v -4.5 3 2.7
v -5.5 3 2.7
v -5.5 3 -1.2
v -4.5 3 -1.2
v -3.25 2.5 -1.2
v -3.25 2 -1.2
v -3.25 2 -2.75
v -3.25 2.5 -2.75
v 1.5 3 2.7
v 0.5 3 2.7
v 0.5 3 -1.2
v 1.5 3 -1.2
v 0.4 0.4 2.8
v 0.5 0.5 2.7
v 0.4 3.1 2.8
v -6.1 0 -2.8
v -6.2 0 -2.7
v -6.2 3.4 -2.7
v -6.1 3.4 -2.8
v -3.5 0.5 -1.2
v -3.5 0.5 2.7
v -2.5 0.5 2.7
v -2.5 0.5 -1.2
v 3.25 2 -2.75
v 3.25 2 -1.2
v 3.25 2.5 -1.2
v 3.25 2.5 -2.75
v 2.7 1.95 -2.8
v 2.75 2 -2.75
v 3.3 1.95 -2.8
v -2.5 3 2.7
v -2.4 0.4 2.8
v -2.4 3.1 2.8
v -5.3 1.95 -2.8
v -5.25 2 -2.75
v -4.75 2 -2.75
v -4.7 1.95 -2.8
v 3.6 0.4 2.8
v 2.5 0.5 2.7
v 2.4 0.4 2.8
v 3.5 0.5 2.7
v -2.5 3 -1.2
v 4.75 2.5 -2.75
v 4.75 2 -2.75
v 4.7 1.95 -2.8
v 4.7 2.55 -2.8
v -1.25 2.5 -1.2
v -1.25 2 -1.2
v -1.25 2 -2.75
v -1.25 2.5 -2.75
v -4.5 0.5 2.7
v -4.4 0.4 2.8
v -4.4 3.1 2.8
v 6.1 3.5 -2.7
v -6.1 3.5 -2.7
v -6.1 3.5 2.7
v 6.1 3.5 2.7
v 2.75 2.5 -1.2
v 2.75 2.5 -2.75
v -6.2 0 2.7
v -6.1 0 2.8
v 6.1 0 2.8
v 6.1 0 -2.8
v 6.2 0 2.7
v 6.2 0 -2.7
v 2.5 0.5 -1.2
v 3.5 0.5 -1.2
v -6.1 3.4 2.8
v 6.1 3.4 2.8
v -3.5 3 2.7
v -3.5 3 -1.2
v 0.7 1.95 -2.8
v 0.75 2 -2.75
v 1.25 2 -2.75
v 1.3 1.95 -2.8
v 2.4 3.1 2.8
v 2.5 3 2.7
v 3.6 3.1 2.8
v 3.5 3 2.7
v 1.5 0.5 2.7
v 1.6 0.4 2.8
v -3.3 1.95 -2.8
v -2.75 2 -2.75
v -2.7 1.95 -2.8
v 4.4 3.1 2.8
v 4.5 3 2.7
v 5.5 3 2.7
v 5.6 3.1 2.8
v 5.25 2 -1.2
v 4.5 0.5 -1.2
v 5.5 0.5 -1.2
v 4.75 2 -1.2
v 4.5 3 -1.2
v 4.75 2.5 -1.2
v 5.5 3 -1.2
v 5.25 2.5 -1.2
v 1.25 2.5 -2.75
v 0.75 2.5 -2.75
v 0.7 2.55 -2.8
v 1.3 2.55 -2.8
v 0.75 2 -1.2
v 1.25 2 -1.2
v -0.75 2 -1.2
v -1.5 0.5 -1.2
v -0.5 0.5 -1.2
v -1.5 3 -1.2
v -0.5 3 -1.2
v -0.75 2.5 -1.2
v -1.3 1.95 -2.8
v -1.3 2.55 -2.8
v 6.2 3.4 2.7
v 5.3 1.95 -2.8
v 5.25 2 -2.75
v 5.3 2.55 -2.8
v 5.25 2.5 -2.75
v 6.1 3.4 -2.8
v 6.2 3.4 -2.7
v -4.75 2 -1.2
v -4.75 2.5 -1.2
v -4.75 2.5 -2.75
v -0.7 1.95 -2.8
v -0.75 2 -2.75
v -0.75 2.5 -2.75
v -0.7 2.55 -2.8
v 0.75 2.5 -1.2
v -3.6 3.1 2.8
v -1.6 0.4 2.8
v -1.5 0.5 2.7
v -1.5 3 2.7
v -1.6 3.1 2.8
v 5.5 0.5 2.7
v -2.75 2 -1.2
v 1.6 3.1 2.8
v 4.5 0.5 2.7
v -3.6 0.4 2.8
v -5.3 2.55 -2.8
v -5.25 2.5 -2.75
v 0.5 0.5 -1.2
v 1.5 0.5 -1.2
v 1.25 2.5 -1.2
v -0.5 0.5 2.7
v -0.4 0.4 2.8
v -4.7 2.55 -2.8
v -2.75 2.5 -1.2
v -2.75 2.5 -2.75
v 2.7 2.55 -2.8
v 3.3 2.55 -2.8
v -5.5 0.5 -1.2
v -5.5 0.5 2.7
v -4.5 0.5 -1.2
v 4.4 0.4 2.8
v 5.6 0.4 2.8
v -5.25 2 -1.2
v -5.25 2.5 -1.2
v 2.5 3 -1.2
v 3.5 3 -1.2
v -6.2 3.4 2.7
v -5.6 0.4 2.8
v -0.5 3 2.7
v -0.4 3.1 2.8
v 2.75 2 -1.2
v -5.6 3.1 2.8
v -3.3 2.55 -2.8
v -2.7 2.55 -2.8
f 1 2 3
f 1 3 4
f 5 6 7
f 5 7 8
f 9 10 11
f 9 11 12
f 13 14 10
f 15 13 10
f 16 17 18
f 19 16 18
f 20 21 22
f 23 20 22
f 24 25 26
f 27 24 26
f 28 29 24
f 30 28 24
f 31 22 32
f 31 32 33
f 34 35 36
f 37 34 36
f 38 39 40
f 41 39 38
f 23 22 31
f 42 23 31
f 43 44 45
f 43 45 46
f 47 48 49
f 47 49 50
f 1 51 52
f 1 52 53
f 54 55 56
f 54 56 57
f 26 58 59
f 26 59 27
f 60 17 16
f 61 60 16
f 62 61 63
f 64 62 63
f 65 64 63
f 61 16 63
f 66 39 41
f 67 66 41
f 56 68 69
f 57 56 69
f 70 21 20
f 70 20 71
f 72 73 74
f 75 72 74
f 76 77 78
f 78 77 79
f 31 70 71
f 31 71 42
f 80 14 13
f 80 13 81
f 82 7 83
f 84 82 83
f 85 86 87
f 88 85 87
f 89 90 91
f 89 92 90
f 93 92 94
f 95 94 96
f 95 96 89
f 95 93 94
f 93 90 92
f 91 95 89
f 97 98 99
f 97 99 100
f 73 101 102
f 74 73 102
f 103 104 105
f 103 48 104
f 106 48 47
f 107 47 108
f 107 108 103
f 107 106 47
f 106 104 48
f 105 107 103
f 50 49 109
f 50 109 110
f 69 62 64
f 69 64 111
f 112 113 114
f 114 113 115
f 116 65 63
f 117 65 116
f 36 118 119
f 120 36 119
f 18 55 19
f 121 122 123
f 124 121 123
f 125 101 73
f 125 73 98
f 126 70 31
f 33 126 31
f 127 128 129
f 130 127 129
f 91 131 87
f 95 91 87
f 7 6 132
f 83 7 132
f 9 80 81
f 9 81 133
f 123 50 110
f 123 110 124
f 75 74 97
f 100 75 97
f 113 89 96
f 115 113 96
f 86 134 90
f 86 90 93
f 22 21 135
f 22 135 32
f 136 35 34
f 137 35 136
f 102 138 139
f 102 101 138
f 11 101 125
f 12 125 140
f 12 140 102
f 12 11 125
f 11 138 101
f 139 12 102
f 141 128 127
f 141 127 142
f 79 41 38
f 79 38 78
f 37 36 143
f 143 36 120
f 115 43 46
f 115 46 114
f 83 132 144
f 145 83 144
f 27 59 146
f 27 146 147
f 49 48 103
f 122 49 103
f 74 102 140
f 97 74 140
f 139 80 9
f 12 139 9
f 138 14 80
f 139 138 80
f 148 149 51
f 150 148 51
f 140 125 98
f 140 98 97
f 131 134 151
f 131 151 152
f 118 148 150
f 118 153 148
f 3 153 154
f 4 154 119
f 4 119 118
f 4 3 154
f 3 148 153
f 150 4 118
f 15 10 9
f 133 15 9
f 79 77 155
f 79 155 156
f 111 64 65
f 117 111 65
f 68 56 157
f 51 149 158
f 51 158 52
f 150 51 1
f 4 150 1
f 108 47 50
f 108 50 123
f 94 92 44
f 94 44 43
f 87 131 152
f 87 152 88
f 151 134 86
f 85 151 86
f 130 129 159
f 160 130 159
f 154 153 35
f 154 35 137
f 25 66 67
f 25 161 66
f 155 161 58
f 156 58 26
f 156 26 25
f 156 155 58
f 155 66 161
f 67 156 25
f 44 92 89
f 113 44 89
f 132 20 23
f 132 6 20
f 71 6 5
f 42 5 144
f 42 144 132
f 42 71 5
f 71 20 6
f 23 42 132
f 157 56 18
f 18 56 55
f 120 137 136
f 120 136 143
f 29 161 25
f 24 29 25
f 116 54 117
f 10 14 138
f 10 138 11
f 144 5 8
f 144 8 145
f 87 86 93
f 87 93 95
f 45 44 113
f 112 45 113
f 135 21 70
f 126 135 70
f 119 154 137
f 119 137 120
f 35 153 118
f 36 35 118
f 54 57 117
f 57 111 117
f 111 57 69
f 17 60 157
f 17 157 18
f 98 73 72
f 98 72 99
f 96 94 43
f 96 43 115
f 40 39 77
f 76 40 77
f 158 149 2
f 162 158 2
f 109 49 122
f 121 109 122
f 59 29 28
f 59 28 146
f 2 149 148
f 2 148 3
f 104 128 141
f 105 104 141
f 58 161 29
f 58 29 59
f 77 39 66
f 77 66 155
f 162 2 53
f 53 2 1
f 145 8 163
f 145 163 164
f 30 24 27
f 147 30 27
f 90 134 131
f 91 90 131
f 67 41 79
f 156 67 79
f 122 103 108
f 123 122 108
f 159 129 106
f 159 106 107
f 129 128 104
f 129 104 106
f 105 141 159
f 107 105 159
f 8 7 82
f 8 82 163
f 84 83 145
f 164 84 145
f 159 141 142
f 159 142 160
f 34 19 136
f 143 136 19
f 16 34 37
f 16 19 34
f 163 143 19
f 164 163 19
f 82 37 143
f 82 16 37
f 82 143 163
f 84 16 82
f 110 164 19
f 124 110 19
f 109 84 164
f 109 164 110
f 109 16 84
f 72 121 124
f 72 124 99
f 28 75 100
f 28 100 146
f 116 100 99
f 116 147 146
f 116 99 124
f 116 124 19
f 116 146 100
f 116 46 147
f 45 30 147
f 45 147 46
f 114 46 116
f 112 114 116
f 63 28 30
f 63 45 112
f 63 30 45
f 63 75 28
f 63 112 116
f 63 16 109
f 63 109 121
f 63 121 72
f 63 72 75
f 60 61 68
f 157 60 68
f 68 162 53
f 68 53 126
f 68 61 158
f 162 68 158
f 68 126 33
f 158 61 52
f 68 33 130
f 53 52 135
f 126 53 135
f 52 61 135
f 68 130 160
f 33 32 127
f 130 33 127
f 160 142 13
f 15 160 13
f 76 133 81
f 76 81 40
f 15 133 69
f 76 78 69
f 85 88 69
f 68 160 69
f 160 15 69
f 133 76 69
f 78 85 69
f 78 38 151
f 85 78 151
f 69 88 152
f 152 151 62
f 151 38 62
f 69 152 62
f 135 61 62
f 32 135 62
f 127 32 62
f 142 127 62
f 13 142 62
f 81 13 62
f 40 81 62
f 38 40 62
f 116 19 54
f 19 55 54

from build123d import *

# Parameters (mm, degrees)
SKETCH1_W                  = 12.4
SKETCH1_H                  = 5.6
BOSS_EXTRUDE1_DEPTH        = 3.5
SKETCH2_W                  = 1
SKETCH2_H                  = 2.5
CUT_EXTRUDE1_DEPTH         = 4
CHAMFER1_SIZE              = 0.1
CUT_EXTRUDE2_REACH         = 10.166
SKETCH3_W                  = 0.5
SKETCH3_H                  = 0.5
CHAMFER3_SIZE              = 0.05
LPATTERN1_COUNT            = 6
LPATTERN1_PITCH            = 2
CHAMFER1_OF_LPATTERN1_SIZE = 0.1
CHAMFER3_OF_LPATTERN1_SIZE = 0.05
CHAMFER2_SIZE              = 0.1


with BuildPart() as part:
    # Sketch1 → Boss-Extrude1 (new body)
    with BuildSketch(Plane(origin=(0, 0, 0), x_dir=(1, 0, 0), z_dir=(0, 1, 0))):
        Rectangle(SKETCH1_W, SKETCH1_H)
    extrude(amount=BOSS_EXTRUDE1_DEPTH)

    # Sketch2 → Cut-Extrude1 (cut)
    with BuildSketch(Plane.XY.offset(2.8)):
        with Locations((-5, 1.75)):
            Rectangle(SKETCH2_W, SKETCH2_H)
    cut_extrude1 = extrude(amount=-CUT_EXTRUDE1_DEPTH, mode=Mode.SUBTRACT)

    # Chamfer1
    chamfer1_edges = [part.edges().sort_by_distance(p)[0] for p in [
        (-5, 3, 2.8),
        (-4.5, 1.75, 2.8),
        (-5.5, 1.75, 2.8),
        (-5, 0.5, 2.8),
    ]]
    chamfer(chamfer1_edges, length=CHAMFER1_SIZE)

    # Sketch3 → Cut-Extrude2 (cut, up to next)
    with BuildSketch(Plane.XY.offset(-1.2), mode=Mode.PRIVATE) as cut_extrude2_sk1:
        with Locations((-5, 2.25)):
            Rectangle(SKETCH3_W, SKETCH3_H)
    cut_extrude2_tool1 = extrude(cut_extrude2_sk1.sketch, amount=-CUT_EXTRUDE2_REACH, mode=Mode.PRIVATE) & part.part
    cut_extrude2 = cut_extrude2_tool1.solids().sort_by_distance((-5, 2.25, -1.2))[0]
    add(cut_extrude2, mode=Mode.SUBTRACT)

    # Chamfer3
    chamfer3_edges = [part.edges().sort_by_distance(p)[0] for p in [
        (-5.25, 2.25, -2.8),
        (-5, 2, -2.8),
        (-5, 2.5, -2.8),
        (-4.75, 2.25, -2.8),
    ]]
    chamfer(chamfer3_edges, length=CHAMFER3_SIZE)

    # LPattern1: Cut-Extrude1, Cut-Extrude2 ×6
    with Locations(*[(i * LPATTERN1_PITCH, 0, 0) for i in range(1, LPATTERN1_COUNT)]):
        add(cut_extrude1, mode=Mode.SUBTRACT)
        add(cut_extrude2, mode=Mode.SUBTRACT)

    # Chamfer1 of LPattern1
    chamfer1_of_lpattern1_edges = [part.edges().sort_by_distance(p)[0] for p in [
        (-3, 3, 2.8),
        (-2.5, 1.75, 2.8),
        (-3.5, 1.75, 2.8),
        (-3, 0.5, 2.8),
        (-1, 3, 2.8),
        (-0.5, 1.75, 2.8),
        (-1.5, 1.75, 2.8),
        (-1, 0.5, 2.8),
        (1, 3, 2.8),
        (1.5, 1.75, 2.8),
        (0.5, 1.75, 2.8),
        (1, 0.5, 2.8),
        (3, 3, 2.8),
        (3.5, 1.75, 2.8),
        (2.5, 1.75, 2.8),
        (3, 0.5, 2.8),
        (5, 3, 2.8),
        (5.5, 1.75, 2.8),
        (4.5, 1.75, 2.8),
        (5, 0.5, 2.8),
    ]]
    chamfer(chamfer1_of_lpattern1_edges, length=CHAMFER1_OF_LPATTERN1_SIZE)

    # Chamfer3 of LPattern1
    chamfer3_of_lpattern1_edges = [part.edges().sort_by_distance(p)[0] for p in [
        (-3.25, 2.25, -2.8),
        (-3, 2, -2.8),
        (-3, 2.5, -2.8),
        (-2.75, 2.25, -2.8),
        (-1.25, 2.25, -2.8),
        (-1, 2, -2.8),
        (-1, 2.5, -2.8),
        (-0.75, 2.25, -2.8),
        (0.75, 2.25, -2.8),
        (1, 2, -2.8),
        (1, 2.5, -2.8),
        (1.25, 2.25, -2.8),
        (2.75, 2.25, -2.8),
        (3, 2, -2.8),
        (3, 2.5, -2.8),
        (3.25, 2.25, -2.8),
        (4.75, 2.25, -2.8),
        (5, 2, -2.8),
        (5, 2.5, -2.8),
        (5.25, 2.25, -2.8),
    ]]
    chamfer(chamfer3_of_lpattern1_edges, length=CHAMFER3_OF_LPATTERN1_SIZE)

    # Chamfer2
    chamfer2_edges = [part.edges().sort_by_distance(p)[0] for p in [
        (6.2, 3.5, 0),
        (0, 3.5, -2.8),
        (-6.2, 3.5, 0),
        (0, 3.5, 2.8),
        (-6.2, 1.75, -2.8),
        (6.2, 1.75, -2.8),
        (6.2, 1.75, 2.8),
        (-6.2, 1.75, 2.8),
    ]]
    chamfer(chamfer2_edges, length=CHAMFER2_SIZE)


solid = part.part
